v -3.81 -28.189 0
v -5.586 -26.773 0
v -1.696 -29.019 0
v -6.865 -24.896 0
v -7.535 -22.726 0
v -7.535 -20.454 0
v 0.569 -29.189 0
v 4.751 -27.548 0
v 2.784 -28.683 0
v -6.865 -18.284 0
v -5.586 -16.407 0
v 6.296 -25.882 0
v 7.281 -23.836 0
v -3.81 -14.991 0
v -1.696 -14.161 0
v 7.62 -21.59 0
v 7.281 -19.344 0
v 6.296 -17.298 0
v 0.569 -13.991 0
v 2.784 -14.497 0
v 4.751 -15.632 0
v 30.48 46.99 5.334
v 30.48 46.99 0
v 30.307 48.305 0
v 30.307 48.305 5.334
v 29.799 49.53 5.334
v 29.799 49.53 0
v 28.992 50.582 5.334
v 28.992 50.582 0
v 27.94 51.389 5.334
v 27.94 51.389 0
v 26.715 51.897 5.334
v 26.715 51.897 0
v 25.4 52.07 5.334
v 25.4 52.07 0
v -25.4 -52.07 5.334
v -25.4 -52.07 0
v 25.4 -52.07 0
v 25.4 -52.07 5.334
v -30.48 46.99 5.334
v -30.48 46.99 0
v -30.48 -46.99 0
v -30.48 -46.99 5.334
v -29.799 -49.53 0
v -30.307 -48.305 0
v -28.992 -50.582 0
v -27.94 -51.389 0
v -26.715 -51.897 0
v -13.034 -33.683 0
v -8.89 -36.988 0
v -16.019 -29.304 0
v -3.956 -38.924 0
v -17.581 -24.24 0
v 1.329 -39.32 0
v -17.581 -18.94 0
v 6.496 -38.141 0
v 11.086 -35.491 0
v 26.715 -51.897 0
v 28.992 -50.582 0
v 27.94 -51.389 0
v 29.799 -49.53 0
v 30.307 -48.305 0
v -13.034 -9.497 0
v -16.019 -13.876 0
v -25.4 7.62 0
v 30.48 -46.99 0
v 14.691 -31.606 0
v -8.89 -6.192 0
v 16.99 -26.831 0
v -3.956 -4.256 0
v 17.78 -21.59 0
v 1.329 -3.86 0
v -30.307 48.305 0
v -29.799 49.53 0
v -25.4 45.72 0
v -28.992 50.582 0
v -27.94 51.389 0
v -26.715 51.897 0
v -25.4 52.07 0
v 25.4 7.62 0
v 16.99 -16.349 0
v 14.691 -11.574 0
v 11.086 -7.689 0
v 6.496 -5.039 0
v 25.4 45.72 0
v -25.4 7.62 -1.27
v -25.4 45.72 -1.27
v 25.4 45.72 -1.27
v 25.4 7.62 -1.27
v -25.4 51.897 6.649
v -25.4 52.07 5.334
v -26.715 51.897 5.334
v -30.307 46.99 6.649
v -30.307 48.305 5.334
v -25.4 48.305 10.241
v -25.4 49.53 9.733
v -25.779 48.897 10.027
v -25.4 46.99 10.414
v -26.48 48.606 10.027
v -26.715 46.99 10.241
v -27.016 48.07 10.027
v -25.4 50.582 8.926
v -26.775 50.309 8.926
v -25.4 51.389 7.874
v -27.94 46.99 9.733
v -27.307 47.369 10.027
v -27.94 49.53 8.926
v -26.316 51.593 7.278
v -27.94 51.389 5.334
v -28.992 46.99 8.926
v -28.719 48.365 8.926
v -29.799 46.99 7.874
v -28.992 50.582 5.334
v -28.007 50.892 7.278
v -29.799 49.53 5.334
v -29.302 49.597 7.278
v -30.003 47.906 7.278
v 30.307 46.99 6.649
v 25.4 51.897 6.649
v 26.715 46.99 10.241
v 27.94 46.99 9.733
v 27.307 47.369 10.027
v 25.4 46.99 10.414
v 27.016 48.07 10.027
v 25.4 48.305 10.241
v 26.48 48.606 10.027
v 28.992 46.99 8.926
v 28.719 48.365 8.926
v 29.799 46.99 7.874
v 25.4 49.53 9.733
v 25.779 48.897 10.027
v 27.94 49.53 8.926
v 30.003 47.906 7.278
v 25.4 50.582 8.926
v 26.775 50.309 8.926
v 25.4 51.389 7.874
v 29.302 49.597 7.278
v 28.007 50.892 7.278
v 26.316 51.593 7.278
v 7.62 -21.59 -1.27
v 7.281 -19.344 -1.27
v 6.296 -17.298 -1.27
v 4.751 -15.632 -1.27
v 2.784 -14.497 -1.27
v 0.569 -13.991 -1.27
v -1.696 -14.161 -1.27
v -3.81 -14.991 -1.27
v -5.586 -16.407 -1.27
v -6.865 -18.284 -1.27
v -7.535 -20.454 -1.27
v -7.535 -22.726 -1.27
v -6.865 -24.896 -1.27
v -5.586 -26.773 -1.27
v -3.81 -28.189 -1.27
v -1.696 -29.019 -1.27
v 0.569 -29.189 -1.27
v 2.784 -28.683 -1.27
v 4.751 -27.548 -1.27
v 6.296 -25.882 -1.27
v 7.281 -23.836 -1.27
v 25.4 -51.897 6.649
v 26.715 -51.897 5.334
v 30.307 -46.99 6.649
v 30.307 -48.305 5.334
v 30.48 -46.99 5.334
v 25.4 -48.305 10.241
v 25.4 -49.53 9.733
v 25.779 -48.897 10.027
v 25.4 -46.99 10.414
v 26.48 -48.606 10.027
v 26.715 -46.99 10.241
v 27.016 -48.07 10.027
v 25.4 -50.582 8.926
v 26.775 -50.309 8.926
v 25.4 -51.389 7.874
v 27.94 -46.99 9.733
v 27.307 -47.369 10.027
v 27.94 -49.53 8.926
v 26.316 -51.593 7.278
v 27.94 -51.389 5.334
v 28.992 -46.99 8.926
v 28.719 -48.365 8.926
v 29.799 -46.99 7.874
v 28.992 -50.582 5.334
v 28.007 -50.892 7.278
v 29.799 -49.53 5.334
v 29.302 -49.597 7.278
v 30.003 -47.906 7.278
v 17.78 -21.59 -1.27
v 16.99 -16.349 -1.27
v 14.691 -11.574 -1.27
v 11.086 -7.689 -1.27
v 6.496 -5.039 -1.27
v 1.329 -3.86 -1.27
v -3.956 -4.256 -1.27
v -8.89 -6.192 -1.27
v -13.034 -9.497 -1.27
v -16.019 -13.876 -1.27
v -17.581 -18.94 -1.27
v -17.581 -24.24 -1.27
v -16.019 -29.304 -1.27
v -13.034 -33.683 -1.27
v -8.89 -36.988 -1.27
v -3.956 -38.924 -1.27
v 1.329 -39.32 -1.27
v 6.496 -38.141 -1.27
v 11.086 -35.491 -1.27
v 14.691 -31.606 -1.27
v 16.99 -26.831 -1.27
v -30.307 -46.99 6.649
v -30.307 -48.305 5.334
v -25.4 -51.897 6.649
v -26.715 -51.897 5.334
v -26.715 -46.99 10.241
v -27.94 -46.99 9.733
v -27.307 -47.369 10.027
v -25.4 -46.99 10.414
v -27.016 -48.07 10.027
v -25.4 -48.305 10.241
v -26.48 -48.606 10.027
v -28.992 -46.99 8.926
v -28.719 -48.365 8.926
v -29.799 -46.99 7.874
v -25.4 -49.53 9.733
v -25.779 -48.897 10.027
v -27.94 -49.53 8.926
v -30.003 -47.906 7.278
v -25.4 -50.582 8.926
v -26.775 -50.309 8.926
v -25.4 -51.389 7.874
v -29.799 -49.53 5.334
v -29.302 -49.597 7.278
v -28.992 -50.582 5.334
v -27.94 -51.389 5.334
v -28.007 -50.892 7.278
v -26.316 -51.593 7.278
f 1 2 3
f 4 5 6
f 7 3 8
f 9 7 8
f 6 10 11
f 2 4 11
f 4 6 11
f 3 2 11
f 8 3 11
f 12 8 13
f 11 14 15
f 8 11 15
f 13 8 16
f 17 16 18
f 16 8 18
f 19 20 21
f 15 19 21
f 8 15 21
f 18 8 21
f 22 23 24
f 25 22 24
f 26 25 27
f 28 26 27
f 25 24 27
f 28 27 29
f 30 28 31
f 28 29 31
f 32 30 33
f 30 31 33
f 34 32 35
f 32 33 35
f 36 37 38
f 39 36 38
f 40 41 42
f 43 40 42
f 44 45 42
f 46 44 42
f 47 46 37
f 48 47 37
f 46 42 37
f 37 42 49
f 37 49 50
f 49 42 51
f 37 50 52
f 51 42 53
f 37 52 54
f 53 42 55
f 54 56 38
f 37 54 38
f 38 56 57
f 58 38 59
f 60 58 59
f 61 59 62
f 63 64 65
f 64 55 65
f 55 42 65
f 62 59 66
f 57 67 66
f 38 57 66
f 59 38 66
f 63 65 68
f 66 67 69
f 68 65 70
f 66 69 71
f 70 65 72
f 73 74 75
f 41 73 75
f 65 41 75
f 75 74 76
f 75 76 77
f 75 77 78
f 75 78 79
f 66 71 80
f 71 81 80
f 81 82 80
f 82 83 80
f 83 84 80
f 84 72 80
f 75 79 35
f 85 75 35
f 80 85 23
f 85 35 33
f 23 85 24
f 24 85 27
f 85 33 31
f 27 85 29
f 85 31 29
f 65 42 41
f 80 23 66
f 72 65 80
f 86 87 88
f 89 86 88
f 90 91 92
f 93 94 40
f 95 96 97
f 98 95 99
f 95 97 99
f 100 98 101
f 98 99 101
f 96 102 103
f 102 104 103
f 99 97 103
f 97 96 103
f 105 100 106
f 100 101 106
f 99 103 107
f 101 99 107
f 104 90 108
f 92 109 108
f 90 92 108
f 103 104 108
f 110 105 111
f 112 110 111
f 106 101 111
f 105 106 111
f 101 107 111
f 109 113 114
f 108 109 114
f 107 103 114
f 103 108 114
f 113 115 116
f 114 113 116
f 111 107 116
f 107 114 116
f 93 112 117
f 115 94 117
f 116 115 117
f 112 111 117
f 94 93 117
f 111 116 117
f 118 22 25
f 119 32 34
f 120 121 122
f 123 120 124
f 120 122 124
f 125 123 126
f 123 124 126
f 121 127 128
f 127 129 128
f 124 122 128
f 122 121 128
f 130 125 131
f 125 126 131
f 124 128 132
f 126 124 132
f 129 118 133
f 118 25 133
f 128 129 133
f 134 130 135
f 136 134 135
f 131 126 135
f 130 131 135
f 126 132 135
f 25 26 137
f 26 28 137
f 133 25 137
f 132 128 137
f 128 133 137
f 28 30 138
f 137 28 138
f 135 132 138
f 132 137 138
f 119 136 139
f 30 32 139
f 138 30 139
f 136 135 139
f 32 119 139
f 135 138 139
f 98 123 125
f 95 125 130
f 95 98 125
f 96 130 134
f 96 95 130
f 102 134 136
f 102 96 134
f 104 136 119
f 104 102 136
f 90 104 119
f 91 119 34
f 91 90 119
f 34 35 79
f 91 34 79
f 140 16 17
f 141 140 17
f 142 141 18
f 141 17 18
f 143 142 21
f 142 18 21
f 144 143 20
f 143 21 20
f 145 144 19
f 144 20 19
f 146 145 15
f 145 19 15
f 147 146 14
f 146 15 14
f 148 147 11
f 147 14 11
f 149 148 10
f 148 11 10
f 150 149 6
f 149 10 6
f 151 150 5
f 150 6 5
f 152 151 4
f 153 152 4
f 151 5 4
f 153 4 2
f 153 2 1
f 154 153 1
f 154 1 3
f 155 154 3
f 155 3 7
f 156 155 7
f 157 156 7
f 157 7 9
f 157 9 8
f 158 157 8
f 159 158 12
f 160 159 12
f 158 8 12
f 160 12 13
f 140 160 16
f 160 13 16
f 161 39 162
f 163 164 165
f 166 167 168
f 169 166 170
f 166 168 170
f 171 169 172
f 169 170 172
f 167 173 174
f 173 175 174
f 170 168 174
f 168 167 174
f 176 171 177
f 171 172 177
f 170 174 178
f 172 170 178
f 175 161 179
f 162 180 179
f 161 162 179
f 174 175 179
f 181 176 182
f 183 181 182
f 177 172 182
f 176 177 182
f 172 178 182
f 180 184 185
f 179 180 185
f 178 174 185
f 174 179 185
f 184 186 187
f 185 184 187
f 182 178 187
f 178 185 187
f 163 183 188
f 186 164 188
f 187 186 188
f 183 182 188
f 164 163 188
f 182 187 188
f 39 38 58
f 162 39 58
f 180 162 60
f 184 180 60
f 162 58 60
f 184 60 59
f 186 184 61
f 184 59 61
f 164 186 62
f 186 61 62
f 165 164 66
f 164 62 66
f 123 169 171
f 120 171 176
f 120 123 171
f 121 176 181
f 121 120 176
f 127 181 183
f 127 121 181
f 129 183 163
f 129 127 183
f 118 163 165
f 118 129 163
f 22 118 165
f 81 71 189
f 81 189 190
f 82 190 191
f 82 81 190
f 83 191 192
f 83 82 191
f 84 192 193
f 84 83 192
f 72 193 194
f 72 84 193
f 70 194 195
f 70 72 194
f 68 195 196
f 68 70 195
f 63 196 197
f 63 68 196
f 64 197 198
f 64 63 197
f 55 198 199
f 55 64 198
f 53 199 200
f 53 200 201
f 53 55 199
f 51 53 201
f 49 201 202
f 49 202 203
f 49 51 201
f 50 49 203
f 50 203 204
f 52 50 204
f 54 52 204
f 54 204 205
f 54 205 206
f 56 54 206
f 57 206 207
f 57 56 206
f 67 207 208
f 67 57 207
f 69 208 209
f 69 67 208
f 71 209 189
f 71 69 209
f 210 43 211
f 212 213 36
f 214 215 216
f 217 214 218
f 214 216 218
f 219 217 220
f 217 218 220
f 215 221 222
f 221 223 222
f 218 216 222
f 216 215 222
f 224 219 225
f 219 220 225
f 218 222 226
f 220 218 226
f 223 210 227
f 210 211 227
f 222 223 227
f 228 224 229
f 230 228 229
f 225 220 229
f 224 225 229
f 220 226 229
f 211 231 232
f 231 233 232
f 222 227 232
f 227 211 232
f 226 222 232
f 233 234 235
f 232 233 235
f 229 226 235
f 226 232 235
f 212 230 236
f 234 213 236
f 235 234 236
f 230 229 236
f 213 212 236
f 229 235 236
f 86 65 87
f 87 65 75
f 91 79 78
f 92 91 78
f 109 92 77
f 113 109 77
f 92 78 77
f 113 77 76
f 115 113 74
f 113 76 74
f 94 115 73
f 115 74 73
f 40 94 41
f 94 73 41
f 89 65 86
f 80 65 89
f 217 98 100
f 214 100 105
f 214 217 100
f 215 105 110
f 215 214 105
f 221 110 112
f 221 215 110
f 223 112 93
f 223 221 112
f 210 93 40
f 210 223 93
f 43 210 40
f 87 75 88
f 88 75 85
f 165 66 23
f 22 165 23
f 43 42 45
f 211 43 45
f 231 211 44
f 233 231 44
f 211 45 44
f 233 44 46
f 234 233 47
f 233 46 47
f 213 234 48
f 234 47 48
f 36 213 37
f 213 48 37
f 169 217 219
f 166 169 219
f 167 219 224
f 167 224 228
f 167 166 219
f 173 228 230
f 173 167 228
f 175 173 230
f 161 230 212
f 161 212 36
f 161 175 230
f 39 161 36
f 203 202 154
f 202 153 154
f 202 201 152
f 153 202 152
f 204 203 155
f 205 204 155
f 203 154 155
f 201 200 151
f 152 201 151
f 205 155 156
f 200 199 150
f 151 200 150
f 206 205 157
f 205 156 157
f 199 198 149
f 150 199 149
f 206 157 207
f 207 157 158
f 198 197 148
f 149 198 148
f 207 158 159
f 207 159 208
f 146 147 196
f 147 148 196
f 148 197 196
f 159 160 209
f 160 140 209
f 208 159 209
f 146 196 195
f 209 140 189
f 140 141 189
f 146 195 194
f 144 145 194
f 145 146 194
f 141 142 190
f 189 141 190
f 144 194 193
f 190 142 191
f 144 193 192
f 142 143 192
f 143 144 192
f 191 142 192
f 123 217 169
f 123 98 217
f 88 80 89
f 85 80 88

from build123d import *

# Parameters (mm, degrees)
F0_R     = 17.78
F0_W     = 50.8
F0_H     = 38.1
F0_R_2   = 7.62
F1_DEPTH = 10.414
F2_DEPTH = 1.27
F3_R     = 5.08


with BuildPart() as f1:
    # F0 (on Top) → F1 (new body)
    with BuildSketch(Plane.XY):
        with BuildLine():
            Line((25.4, 52.07), (-25.4, 52.07))
            ThreePointArc((-25.4, 52.07), (-28.9921024484, 50.5821024484), (-30.48, 46.99))
            Line((-30.48, 46.99), (-30.48, -46.99))
            ThreePointArc((-30.48, -46.99), (-28.9921024484, -50.5821024484), (-25.4, -52.07))
            Line((-25.4, -52.07), (25.4, -52.07))
            ThreePointArc((25.4, -52.07), (28.9921024484, -50.5821024484), (30.48, -46.99))
            Line((30.48, -46.99), (30.48, 46.99))
            ThreePointArc((30.48, 46.99), (28.9921024484, 50.5821024484), (25.4, 52.07))
        make_face()
        with Locations((0, -21.59)):
            Circle(F0_R, mode=Mode.SUBTRACT)
        with Locations((0, 26.67)):
            Rectangle(F0_W, F0_H, mode=Mode.SUBTRACT)
        with Locations((0, 26.67)):
            Rectangle(F0_W, F0_H)
        with Locations((0, -21.59)):
            Circle(F0_R)
        with Locations((0, -21.59)):
            Circle(F0_R_2, mode=Mode.SUBTRACT)
        with Locations((0, -21.59)):
            Circle(F0_R_2)
    extrude(amount=F1_DEPTH)

    # F0 (on Top) → F2 (join)
    with BuildSketch(Plane.XY):
        with Locations((0, -21.59)):
            Circle(F0_R)
        with Locations((0, -21.59)):
            Circle(F0_R_2, mode=Mode.SUBTRACT)
        with Locations((0, 26.67)):
            Rectangle(F0_W, F0_H)
    extrude(amount=-F2_DEPTH)

    # F3
    f3_edges = [f1.edges().sort_by_distance(p)[0] for p in [
        (0, -52.07, 10.414),
        (0, 52.07, 10.414),
    ]]
    fillet(f3_edges, radius=F3_R)


solid = f1.part
